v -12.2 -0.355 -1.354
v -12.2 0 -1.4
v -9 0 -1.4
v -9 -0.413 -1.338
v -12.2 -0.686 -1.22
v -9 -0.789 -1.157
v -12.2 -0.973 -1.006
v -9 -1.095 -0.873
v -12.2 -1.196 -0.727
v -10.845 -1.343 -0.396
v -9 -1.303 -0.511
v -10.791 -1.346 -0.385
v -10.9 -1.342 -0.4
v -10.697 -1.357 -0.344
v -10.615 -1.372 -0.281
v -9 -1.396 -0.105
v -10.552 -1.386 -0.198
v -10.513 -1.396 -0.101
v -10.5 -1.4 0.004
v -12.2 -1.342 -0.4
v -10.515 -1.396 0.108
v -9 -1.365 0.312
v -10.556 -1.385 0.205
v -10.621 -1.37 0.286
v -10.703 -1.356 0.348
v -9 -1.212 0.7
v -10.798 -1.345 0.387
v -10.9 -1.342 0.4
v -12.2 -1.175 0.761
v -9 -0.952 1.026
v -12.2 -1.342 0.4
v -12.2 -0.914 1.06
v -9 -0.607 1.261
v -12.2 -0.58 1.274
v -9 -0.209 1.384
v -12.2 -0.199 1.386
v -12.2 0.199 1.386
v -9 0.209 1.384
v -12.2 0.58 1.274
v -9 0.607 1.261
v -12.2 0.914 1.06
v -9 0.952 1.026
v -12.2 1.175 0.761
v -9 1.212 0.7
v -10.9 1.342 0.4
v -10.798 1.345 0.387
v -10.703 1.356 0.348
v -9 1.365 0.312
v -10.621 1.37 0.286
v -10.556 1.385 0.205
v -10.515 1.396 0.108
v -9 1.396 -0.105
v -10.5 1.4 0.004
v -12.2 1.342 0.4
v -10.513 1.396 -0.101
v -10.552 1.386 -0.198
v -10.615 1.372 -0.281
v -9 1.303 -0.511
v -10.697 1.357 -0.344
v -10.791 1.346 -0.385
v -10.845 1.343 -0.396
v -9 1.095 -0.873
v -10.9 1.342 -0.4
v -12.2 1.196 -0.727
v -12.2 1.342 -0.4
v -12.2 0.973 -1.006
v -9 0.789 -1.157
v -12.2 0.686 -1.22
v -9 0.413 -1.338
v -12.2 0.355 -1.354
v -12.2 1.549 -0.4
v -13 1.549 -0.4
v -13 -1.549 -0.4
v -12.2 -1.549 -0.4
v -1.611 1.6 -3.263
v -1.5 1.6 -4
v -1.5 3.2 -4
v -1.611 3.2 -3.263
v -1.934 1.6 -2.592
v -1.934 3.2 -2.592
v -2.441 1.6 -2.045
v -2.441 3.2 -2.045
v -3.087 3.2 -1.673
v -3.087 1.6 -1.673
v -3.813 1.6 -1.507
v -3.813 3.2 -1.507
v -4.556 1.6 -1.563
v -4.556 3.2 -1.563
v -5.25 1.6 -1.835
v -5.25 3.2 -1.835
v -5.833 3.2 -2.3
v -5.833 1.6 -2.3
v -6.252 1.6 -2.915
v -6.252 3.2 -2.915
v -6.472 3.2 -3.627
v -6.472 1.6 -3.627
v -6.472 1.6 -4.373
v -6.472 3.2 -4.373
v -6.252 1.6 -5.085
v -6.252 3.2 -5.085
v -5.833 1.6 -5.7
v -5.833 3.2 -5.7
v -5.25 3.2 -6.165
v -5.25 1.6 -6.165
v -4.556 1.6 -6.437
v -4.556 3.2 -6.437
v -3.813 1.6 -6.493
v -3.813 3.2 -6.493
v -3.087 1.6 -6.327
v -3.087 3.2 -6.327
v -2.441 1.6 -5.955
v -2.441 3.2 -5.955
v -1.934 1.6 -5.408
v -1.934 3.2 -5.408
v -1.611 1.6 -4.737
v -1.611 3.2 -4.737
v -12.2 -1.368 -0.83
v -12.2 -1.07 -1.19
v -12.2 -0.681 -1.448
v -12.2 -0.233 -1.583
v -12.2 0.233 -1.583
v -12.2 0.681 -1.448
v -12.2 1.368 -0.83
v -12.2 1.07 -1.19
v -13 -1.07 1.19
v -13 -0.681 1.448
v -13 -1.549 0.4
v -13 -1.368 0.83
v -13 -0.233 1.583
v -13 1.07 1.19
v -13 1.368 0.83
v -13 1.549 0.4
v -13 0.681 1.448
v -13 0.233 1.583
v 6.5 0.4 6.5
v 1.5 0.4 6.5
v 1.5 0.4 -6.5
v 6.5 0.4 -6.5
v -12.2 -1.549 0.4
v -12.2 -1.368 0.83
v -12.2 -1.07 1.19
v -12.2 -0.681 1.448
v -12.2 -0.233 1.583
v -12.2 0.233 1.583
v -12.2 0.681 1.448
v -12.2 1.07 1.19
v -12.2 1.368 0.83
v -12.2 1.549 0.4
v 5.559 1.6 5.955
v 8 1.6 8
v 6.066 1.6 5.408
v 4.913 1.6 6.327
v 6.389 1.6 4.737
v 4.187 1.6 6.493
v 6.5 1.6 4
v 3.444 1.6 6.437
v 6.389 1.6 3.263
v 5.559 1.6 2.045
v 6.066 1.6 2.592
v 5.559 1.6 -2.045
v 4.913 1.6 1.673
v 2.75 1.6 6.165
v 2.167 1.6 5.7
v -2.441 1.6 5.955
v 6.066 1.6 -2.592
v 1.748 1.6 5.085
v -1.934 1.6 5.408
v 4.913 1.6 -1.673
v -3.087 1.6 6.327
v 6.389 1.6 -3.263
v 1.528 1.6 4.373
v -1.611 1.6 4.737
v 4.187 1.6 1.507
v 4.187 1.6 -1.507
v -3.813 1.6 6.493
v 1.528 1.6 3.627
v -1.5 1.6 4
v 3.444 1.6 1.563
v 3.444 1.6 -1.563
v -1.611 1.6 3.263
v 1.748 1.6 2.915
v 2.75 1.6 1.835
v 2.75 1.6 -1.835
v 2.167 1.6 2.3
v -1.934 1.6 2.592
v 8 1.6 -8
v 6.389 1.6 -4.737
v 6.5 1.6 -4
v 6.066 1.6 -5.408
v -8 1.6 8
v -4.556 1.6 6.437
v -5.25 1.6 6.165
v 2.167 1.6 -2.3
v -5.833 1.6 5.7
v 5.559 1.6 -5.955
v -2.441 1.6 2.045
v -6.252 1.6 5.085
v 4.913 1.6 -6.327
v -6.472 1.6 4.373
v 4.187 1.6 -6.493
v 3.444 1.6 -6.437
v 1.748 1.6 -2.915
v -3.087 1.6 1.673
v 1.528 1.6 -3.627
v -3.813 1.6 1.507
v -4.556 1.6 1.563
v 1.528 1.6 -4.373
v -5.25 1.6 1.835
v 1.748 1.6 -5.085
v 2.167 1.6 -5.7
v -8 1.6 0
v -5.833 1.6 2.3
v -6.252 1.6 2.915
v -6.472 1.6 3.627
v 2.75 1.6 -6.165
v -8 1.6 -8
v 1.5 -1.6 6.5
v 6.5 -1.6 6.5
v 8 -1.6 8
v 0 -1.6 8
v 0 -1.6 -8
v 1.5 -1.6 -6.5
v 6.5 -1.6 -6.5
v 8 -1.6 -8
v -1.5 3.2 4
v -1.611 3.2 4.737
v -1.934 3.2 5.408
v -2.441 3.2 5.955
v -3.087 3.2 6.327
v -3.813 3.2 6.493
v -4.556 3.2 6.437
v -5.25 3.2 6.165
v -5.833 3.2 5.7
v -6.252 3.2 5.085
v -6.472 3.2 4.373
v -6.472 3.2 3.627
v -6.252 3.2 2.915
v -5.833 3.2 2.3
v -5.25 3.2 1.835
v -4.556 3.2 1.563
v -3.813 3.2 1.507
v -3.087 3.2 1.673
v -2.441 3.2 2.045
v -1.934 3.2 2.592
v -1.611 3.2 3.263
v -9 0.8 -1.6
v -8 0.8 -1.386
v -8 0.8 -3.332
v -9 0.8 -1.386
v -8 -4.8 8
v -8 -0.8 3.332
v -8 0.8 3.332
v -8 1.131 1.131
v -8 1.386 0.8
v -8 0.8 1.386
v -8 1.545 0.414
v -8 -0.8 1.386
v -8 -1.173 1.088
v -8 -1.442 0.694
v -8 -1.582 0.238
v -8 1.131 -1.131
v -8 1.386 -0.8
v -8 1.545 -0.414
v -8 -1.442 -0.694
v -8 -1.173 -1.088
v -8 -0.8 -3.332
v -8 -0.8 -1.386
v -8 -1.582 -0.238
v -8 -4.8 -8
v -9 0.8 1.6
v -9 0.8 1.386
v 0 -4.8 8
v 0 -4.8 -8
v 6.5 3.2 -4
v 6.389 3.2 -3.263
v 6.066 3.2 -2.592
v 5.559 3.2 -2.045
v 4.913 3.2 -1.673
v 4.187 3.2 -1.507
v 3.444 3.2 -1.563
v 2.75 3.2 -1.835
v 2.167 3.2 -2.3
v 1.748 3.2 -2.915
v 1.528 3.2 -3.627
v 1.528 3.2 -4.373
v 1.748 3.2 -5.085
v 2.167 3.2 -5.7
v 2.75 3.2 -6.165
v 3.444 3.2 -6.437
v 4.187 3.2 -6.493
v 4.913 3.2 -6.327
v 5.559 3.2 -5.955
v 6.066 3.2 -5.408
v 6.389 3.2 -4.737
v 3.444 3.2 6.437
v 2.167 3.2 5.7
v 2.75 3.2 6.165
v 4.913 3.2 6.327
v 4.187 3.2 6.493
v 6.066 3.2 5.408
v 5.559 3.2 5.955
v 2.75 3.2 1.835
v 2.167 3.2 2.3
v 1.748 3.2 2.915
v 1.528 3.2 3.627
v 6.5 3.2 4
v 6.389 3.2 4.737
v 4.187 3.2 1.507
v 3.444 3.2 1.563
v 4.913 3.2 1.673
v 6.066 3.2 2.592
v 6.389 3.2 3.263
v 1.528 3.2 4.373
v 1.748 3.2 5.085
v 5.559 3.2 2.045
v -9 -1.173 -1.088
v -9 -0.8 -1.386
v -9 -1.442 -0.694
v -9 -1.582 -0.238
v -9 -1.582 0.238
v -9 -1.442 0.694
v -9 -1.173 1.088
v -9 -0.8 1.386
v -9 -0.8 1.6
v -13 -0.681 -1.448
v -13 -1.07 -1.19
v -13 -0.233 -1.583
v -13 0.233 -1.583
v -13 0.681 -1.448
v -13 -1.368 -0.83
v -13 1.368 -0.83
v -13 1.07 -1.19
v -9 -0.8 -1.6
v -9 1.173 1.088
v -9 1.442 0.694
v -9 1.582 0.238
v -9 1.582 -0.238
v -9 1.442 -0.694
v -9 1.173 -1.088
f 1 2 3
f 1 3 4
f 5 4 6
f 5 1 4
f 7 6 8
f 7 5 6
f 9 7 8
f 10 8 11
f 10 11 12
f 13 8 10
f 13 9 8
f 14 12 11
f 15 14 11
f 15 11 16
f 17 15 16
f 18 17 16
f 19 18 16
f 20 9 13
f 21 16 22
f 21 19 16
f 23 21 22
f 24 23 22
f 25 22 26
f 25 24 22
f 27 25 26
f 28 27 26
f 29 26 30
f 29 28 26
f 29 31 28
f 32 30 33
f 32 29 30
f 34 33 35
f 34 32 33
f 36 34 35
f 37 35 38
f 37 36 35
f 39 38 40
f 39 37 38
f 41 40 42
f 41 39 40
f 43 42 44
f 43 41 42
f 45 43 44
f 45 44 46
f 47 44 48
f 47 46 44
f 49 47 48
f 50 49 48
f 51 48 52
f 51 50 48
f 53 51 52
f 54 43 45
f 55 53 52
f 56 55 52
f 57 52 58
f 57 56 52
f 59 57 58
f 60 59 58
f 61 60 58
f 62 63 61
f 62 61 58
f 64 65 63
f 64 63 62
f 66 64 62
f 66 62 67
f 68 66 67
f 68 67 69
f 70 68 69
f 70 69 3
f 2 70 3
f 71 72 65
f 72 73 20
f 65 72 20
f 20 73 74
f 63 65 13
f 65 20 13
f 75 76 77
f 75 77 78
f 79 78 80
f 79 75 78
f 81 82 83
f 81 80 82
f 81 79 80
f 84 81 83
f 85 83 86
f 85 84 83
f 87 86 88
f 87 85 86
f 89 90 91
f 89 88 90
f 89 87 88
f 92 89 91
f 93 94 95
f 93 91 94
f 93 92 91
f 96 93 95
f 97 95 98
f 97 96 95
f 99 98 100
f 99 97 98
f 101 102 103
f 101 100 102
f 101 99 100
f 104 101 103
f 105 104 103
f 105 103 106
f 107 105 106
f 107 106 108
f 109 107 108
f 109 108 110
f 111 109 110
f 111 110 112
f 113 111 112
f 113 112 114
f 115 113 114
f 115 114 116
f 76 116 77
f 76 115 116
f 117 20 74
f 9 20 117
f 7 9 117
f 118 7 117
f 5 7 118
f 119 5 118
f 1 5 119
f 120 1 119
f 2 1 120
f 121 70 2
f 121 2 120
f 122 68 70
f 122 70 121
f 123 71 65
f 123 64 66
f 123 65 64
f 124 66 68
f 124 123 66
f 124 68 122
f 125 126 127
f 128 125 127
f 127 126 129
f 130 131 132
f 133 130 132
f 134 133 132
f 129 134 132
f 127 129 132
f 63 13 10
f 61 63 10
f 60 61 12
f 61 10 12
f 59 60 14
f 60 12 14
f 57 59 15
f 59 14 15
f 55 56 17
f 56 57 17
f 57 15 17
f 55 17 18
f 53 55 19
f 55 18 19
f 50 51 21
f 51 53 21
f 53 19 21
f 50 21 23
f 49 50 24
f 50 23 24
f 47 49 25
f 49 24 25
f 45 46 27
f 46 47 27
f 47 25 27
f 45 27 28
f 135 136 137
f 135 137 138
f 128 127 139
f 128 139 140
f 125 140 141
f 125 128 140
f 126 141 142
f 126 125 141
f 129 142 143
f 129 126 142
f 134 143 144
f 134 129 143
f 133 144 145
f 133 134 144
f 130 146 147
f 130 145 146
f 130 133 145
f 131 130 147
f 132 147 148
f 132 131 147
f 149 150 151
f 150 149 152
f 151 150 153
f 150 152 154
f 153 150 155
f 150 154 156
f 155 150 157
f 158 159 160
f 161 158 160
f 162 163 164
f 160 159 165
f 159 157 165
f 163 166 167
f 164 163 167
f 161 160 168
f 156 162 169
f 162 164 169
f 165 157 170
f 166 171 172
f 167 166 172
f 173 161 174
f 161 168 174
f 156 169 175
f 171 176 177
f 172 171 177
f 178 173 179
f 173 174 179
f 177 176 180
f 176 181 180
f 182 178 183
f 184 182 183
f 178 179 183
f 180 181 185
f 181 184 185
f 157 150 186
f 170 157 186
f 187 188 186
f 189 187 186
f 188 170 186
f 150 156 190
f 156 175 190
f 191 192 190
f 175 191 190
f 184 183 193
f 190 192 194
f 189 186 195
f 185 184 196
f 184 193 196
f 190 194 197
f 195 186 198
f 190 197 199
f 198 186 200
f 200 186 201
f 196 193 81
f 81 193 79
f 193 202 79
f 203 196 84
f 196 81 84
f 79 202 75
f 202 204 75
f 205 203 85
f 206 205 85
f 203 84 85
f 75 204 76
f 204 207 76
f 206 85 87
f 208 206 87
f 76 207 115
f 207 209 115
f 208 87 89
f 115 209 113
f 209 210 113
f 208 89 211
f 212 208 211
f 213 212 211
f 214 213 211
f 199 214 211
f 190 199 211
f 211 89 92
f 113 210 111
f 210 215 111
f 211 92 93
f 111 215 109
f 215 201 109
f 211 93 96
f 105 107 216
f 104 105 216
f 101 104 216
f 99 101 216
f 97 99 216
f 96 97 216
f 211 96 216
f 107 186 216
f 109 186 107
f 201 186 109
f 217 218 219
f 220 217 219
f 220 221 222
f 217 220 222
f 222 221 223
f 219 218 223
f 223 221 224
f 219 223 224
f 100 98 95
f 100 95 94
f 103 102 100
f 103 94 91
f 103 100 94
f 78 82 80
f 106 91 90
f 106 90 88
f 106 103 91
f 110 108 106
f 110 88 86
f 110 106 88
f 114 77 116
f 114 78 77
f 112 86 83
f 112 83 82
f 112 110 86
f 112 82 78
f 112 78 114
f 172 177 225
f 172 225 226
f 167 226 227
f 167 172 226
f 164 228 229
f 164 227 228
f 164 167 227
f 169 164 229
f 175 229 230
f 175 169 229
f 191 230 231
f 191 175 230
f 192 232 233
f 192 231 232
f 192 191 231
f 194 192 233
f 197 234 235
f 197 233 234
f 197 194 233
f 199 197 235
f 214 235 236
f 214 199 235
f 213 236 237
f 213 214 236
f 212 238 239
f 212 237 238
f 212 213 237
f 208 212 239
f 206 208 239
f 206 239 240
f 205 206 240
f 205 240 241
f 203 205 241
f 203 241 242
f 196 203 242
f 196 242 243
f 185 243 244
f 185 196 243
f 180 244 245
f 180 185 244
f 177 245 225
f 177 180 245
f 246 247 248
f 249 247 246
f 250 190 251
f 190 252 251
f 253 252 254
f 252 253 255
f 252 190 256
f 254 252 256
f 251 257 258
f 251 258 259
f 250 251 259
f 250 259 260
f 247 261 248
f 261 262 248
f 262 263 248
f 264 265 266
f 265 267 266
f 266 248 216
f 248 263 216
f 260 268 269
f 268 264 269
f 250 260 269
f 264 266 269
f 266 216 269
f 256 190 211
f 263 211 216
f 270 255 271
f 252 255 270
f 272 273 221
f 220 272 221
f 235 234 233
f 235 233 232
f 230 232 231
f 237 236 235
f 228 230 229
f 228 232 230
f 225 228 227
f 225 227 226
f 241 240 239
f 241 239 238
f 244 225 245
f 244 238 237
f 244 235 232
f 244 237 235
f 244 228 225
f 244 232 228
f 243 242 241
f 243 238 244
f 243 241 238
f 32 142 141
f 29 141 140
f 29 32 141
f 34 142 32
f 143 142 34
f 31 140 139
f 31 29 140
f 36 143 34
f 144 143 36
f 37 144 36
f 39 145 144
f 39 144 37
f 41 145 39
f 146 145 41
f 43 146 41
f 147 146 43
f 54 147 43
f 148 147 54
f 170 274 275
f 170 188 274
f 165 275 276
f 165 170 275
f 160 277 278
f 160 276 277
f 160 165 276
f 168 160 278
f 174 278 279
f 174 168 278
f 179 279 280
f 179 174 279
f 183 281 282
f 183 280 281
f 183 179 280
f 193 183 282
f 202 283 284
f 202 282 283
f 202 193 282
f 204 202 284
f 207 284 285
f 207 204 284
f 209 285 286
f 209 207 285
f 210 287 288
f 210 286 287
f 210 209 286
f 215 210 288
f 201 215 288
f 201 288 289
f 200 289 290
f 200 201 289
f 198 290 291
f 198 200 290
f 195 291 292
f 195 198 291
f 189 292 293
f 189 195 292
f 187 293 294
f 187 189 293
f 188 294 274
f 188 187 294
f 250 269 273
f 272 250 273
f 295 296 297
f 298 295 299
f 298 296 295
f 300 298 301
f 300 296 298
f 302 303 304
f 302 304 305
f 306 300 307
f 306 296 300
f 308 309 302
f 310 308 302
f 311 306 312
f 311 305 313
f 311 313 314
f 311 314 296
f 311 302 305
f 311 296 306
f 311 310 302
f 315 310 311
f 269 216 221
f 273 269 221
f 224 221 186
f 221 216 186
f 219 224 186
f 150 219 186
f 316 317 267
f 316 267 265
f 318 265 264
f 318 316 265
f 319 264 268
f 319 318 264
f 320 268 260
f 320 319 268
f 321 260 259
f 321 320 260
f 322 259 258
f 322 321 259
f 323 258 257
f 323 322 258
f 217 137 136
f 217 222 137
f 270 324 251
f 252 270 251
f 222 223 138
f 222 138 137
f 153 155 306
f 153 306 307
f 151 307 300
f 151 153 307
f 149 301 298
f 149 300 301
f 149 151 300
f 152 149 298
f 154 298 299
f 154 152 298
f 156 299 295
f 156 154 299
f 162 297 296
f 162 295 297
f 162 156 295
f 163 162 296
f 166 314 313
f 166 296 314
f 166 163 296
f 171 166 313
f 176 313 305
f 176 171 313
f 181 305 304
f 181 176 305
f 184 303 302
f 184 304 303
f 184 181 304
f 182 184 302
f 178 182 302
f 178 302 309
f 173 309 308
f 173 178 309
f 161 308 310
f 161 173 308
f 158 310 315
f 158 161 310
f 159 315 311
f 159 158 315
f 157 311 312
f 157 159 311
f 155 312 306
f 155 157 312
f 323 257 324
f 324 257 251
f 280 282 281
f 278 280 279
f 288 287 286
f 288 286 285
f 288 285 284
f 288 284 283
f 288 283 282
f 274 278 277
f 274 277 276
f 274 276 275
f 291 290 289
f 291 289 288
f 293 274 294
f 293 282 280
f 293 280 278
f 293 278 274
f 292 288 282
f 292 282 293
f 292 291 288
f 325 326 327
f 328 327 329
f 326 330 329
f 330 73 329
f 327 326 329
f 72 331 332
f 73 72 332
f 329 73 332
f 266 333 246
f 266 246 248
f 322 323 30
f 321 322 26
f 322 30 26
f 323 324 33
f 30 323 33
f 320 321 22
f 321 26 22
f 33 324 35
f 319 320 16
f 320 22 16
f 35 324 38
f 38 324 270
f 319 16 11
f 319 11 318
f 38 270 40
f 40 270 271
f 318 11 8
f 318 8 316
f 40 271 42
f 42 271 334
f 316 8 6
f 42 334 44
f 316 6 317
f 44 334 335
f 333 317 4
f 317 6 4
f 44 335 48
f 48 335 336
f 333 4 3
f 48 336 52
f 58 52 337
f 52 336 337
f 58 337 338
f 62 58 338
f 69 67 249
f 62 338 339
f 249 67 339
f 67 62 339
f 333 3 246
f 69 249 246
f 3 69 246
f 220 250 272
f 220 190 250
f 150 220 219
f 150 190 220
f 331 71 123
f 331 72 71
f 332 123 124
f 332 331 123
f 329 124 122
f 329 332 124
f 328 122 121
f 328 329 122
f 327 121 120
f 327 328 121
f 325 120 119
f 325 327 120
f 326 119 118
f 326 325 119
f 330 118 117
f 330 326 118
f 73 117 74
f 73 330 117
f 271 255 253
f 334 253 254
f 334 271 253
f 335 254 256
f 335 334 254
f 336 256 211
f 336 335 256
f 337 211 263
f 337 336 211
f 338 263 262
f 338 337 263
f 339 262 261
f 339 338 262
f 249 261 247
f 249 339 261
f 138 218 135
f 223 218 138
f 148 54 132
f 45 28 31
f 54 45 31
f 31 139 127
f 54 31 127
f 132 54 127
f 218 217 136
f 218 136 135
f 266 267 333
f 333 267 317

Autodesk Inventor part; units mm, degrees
ref_plane "YZ Plane" through (0, 0, 0) normal (1, 0, 0) x (0, 1, 0)
ref_plane "XZ Plane" through (0, 0, 0) normal (0, 1, 0) x (-1, 0, 0)
ref_plane "XY Plane" through (0, 0, 0) normal (0, 0, 1) x (1, 0, 0)
sketch "Sketch1" plane through (0, 0, 0) normal (0, 0, 1) x (1, 0, 0)
  line L0 (8, 1.6) -> (-8, 1.6)
  line L1 (-8, 1.6) -> (-8, -4.8)
  line L2 (-8, -4.8) -> (0, -4.8)
  line L3 (8, -1.6) -> (8, 1.6)
  line L4 (0, -4.8) -> (0, -1.6)
  line L5 (0, -1.6) -> (8, -1.6)
  line L6 (-11.2, 0) -> (11.2, 0) construction
  line L7 (0, -6.08) -> (0, 2.88) construction
  point P0 (0, 1.6)
  point P1 (8, 0)
  dimension "d0" = 16
  dimension "d1" = 3.2
  dimension "d2" = 6.4
extrude "Extrusion1" add sketch "Sketch1" along normal mid plane 16
sketch "Sketch2" plane through (-8, 1.6, 8) normal (0, 1, 0) x (1, 0, 0)
  line L0 (4, 12) -> (12, 12) construction
  line L1 (12, 12) -> (12, 4) construction
  line L2 (12, 4) -> (4, 4) construction
  line L3 (4, 4) -> (4, 12) construction
  line L4 (-3.2, 8) -> (19.2, 8) construction
  line L5 (8, 19.2) -> (8, -3.2) construction
  circle A0 centre (4, 12) radius 2.5
  circle A1 centre (12, 12) radius 2.5
  circle A2 centre (12, 4) radius 2.5
  circle A3 centre (4, 4) radius 2.5
  point P0 (8, 12)
  point P1 (12, 8)
  dimension "d5" = 8
  dimension "d6" = 5
extrude "Extrusion2" add sketch "Sketch2" along normal blind 1.6
sketch "Sketch4" plane through (0, 0, 0) normal (0, 1, 0) x (-1, 0, 0)
  line L0 (8, -8) -> (8, 8) construction
  line L1 (14, 0) -> (7, 0) construction
  line L2 (8, 0) -> (8, -1.6)
  line L3 (8, -1.6) -> (9, -1.6)
  line L4 (9, -1.6) -> (9, -1.4)
  line L5 (9, -1.4) -> (12.2, -1.4)
  line L6 (12.2, -1.4) -> (12.2, -1.6)
  line L7 (12.2, -1.6) -> (13, -1.6)
  line L8 (13, -1.6) -> (13, 0)
  line L9 (13, 0) -> (8, 0)
  dimension "d9" = 2.8
  dimension "d11" = 3.2
  dimension "d12" = 5
  dimension "d13" = 3.2
  dimension "d14" = 0.8
revolve "Revolution1" add sketch "Sketch4" angle 360 about axis through (-13, 0, 0) along (1, 0, 0)
sketch "Sketch5" plane through (0, 0, 0) normal (0, 1, 0) x (-1, 0, 0)
  line L0 (9, 1.6) -> (9, -1.6) projected
  line L1 (8, -8) -> (8, 8) projected
  line L2 (9, -1.6) -> (8, -3.3321)
  line L3 (9, 1.6) -> (8, 3.3321)
  dimension "d16" = 30
extrude "Extrusion3" add sketch "Sketch5" along normal mid plane 1.6
sketch "Sketch6" plane through (0, 0, 0) normal (0, 1, 0) x (-1, 0, 0)
  line L0 (13, 1.6) -> (13, -1.6) construction
  line L1 (13, -0.4) -> (10.9, -0.4)
  arc A0 (10.9, 0.4) -> (10.9, -0.4) centre (10.9, 0) ccw
  line L2 (10.9, 0.4) -> (13, 0.4)
  line L3 (13, 0.4) -> (13, -0.4)
  point P0 (13, 0)
  dimension "d19" = 0.8
  dimension "d20" = 2.5
extrude "Extrusion4" cut sketch "Sketch6" along normal through all both and the other way through all
sketch "Sketch7" plane through (0, -1.6, 8) normal (0, -1, 0) x (1, 0, 0)
  circle A0 centre (4, -4) radius 2.5 construction
  circle A1 centre (4, -12) radius 2.5 construction
  line L0 (1.5, -1.5) -> (6.5, -1.5)
  line L1 (6.5, -1.5) -> (6.5, -14.5)
  line L2 (6.5, -14.5) -> (1.5, -14.5)
  line L3 (1.5, -14.5) -> (1.5, -1.5)
  arc A2 (6.5, -5.783) -> (6.5, -10.217) centre (6.5, -8) ccw
  arc A3 (1.5, -10.217) -> (1.5, -5.783) centre (1.5, -8) ccw
extrude "Extrusion5" cut sketch "Sketch7" against normal blind 2
properties part number "LEGO Brick 4488" material "Steel"
